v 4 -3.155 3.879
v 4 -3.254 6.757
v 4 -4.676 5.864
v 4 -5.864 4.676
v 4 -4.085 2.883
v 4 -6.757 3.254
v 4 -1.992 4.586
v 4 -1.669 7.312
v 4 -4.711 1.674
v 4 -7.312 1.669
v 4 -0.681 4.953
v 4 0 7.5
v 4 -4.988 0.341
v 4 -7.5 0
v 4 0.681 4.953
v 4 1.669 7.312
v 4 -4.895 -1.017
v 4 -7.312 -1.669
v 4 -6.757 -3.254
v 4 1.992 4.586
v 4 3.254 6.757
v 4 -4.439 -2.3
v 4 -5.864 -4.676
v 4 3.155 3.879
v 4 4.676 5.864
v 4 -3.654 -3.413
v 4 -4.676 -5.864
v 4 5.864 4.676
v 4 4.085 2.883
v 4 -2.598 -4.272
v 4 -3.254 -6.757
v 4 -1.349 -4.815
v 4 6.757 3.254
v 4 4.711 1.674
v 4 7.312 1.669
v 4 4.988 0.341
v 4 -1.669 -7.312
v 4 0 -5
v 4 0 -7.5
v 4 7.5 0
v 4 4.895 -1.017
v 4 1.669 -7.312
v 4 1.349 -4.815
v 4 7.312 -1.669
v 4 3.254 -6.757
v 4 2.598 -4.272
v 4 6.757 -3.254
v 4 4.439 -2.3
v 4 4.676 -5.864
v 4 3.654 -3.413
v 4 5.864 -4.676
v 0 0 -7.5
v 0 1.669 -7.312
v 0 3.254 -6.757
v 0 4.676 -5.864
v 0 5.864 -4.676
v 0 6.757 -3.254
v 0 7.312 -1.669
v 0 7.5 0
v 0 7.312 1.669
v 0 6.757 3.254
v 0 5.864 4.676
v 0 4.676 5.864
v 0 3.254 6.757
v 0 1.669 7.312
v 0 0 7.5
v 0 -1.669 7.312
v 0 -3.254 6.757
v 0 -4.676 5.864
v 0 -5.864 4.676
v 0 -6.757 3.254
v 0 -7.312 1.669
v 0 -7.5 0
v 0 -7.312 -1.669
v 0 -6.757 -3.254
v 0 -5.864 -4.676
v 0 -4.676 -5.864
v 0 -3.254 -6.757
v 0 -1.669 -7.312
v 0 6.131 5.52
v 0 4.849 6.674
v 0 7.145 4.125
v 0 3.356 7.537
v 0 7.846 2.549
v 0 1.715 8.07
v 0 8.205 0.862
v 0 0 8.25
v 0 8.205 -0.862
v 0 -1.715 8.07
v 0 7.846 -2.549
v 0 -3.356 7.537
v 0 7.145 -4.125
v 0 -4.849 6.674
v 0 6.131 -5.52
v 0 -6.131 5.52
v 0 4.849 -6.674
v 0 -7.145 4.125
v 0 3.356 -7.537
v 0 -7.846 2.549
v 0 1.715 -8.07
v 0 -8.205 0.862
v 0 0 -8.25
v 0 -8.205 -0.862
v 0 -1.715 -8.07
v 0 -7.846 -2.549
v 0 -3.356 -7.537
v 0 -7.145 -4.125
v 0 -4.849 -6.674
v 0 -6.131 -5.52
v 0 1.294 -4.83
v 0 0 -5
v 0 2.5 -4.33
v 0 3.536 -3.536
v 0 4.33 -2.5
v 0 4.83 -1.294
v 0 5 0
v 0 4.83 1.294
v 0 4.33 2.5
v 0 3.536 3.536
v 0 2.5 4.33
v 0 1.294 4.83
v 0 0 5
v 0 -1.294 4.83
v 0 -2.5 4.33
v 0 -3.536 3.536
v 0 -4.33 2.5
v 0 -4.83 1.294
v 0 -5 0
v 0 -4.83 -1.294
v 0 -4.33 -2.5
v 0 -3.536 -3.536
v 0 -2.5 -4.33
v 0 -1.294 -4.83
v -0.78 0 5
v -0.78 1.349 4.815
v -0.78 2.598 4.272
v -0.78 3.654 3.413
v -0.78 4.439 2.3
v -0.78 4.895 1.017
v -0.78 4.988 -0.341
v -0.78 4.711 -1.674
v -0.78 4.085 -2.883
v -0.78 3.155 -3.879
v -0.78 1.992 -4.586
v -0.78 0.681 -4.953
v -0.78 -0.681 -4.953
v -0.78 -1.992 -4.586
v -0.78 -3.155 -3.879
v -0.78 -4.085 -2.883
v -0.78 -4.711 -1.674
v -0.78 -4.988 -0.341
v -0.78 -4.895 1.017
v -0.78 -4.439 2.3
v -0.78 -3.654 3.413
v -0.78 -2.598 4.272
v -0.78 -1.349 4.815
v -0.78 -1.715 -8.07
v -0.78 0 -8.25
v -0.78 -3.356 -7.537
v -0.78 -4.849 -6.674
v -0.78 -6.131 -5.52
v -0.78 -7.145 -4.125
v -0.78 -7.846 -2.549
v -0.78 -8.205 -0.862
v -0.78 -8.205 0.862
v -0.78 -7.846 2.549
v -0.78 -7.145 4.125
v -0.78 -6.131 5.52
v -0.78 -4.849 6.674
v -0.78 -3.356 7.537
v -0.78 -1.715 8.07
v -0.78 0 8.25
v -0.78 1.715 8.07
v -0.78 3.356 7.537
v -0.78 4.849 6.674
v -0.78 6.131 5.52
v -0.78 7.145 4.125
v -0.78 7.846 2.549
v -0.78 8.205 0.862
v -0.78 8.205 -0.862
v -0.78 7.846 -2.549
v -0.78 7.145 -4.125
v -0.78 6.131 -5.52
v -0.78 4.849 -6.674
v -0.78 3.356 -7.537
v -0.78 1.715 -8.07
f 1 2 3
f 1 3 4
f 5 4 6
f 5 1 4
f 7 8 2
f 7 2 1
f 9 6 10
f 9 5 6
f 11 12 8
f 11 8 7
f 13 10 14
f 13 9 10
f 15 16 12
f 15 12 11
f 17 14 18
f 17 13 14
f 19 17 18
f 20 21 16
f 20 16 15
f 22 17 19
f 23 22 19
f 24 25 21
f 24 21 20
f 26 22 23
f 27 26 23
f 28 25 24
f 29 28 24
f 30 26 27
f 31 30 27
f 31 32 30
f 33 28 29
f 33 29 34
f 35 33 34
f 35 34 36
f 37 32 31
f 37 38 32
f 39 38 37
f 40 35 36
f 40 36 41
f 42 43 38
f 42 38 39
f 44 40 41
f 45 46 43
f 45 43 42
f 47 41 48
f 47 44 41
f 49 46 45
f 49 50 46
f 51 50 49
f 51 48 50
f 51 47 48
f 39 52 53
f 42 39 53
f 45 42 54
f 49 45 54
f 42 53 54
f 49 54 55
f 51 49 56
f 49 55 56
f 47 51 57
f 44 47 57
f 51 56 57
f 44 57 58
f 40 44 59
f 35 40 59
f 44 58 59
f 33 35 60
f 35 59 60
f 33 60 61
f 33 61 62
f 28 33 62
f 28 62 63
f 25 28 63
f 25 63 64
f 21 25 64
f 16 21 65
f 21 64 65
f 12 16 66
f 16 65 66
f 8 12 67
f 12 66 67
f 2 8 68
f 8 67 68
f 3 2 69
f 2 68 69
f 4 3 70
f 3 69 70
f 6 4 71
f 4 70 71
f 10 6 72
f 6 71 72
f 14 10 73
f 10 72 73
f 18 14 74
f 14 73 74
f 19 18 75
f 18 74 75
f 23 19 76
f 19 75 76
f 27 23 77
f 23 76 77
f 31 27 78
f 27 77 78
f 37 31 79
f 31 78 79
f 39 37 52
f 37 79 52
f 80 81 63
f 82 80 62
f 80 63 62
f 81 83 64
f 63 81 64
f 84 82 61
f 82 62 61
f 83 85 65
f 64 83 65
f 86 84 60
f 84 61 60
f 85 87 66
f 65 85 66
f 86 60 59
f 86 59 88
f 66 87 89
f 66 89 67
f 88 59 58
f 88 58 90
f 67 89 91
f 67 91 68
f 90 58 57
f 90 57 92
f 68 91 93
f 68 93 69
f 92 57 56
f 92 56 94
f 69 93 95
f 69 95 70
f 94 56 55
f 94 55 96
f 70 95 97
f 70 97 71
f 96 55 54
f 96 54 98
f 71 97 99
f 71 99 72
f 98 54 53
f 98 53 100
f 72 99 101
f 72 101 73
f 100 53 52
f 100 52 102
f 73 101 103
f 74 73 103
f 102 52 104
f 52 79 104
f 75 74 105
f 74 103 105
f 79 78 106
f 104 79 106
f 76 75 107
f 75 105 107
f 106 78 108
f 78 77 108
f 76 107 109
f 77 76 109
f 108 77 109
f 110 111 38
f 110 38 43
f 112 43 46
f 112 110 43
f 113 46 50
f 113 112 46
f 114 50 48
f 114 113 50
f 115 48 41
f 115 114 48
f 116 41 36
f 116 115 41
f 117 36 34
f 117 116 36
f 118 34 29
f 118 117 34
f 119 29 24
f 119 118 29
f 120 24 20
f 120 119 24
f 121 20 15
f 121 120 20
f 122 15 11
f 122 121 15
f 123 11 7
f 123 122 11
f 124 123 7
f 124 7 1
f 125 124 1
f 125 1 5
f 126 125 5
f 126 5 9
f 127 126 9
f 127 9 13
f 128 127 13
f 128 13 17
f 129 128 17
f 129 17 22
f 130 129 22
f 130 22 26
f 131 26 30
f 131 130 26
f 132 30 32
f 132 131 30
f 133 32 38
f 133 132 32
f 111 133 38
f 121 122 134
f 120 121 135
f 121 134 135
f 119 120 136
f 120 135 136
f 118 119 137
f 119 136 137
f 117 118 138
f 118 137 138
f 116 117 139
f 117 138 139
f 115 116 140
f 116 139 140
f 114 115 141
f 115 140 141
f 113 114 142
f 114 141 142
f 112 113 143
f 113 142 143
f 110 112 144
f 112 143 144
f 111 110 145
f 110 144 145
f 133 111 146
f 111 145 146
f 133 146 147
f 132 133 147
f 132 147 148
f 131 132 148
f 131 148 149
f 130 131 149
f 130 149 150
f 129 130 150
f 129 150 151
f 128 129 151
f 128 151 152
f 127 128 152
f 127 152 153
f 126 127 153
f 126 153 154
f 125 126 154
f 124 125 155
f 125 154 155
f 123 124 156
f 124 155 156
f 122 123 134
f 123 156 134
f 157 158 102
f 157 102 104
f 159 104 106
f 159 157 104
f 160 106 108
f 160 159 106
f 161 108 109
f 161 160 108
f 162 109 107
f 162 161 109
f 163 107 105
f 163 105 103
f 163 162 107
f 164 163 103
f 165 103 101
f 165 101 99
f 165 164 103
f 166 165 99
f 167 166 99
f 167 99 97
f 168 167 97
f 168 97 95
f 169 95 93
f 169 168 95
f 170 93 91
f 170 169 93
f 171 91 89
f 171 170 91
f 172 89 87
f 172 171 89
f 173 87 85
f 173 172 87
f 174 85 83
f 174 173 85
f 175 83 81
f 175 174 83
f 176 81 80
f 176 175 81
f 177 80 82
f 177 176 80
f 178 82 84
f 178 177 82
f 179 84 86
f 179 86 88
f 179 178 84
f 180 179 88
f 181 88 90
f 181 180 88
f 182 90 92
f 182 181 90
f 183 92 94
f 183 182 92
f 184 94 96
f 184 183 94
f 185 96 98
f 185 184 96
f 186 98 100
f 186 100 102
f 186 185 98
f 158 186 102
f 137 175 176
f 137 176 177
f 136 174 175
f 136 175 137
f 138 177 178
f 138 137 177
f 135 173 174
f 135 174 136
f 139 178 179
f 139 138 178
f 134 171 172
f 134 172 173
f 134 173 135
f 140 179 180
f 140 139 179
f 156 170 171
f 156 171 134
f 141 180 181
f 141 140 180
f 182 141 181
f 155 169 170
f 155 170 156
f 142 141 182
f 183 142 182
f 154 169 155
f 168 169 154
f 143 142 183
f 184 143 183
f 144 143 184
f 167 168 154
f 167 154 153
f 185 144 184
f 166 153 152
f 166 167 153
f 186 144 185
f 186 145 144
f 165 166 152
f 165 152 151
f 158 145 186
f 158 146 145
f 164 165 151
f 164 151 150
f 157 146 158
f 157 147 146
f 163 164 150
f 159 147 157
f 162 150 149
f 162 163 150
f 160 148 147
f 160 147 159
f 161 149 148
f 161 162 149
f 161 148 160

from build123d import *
from build123d.topology import SkipClean

# Parameters (mm, degrees)
SKETCH_1_R      = 7.5
SKETCH_1_R_2    = 5
EXTRUDE_3_DEPTH = 4
EXTRUDE_START   = 0.78
SKETCH_3_R      = 8.25
SKETCH_3_R_2    = 5
EXTRUDE_4_DEPTH = 0.78


with BuildPart() as part:
    # 草图1 → 凸台-拉伸3 (new body)
    with BuildSketch(Plane(origin=(0, 0, 0), x_dir=(0, 0, -1), z_dir=(1, 0, 0))):
        Circle(SKETCH_1_R)
        Circle(SKETCH_1_R_2, mode=Mode.SUBTRACT)
    extrude(amount=EXTRUDE_3_DEPTH)

    # 草图3 → 凸台-拉伸4 (add)
    with SkipClean():  # the faces are left unmerged after this step: merging them gives an invalid solid
        with BuildSketch(Plane.ZY.offset(EXTRUDE_START)):
            with Locations(Location((0, 0, 0), (0, 0, 180))):
                Circle(SKETCH_3_R)
            Circle(SKETCH_3_R_2, mode=Mode.SUBTRACT)
        extrude(amount=-EXTRUDE_4_DEPTH)


solid = part.part
